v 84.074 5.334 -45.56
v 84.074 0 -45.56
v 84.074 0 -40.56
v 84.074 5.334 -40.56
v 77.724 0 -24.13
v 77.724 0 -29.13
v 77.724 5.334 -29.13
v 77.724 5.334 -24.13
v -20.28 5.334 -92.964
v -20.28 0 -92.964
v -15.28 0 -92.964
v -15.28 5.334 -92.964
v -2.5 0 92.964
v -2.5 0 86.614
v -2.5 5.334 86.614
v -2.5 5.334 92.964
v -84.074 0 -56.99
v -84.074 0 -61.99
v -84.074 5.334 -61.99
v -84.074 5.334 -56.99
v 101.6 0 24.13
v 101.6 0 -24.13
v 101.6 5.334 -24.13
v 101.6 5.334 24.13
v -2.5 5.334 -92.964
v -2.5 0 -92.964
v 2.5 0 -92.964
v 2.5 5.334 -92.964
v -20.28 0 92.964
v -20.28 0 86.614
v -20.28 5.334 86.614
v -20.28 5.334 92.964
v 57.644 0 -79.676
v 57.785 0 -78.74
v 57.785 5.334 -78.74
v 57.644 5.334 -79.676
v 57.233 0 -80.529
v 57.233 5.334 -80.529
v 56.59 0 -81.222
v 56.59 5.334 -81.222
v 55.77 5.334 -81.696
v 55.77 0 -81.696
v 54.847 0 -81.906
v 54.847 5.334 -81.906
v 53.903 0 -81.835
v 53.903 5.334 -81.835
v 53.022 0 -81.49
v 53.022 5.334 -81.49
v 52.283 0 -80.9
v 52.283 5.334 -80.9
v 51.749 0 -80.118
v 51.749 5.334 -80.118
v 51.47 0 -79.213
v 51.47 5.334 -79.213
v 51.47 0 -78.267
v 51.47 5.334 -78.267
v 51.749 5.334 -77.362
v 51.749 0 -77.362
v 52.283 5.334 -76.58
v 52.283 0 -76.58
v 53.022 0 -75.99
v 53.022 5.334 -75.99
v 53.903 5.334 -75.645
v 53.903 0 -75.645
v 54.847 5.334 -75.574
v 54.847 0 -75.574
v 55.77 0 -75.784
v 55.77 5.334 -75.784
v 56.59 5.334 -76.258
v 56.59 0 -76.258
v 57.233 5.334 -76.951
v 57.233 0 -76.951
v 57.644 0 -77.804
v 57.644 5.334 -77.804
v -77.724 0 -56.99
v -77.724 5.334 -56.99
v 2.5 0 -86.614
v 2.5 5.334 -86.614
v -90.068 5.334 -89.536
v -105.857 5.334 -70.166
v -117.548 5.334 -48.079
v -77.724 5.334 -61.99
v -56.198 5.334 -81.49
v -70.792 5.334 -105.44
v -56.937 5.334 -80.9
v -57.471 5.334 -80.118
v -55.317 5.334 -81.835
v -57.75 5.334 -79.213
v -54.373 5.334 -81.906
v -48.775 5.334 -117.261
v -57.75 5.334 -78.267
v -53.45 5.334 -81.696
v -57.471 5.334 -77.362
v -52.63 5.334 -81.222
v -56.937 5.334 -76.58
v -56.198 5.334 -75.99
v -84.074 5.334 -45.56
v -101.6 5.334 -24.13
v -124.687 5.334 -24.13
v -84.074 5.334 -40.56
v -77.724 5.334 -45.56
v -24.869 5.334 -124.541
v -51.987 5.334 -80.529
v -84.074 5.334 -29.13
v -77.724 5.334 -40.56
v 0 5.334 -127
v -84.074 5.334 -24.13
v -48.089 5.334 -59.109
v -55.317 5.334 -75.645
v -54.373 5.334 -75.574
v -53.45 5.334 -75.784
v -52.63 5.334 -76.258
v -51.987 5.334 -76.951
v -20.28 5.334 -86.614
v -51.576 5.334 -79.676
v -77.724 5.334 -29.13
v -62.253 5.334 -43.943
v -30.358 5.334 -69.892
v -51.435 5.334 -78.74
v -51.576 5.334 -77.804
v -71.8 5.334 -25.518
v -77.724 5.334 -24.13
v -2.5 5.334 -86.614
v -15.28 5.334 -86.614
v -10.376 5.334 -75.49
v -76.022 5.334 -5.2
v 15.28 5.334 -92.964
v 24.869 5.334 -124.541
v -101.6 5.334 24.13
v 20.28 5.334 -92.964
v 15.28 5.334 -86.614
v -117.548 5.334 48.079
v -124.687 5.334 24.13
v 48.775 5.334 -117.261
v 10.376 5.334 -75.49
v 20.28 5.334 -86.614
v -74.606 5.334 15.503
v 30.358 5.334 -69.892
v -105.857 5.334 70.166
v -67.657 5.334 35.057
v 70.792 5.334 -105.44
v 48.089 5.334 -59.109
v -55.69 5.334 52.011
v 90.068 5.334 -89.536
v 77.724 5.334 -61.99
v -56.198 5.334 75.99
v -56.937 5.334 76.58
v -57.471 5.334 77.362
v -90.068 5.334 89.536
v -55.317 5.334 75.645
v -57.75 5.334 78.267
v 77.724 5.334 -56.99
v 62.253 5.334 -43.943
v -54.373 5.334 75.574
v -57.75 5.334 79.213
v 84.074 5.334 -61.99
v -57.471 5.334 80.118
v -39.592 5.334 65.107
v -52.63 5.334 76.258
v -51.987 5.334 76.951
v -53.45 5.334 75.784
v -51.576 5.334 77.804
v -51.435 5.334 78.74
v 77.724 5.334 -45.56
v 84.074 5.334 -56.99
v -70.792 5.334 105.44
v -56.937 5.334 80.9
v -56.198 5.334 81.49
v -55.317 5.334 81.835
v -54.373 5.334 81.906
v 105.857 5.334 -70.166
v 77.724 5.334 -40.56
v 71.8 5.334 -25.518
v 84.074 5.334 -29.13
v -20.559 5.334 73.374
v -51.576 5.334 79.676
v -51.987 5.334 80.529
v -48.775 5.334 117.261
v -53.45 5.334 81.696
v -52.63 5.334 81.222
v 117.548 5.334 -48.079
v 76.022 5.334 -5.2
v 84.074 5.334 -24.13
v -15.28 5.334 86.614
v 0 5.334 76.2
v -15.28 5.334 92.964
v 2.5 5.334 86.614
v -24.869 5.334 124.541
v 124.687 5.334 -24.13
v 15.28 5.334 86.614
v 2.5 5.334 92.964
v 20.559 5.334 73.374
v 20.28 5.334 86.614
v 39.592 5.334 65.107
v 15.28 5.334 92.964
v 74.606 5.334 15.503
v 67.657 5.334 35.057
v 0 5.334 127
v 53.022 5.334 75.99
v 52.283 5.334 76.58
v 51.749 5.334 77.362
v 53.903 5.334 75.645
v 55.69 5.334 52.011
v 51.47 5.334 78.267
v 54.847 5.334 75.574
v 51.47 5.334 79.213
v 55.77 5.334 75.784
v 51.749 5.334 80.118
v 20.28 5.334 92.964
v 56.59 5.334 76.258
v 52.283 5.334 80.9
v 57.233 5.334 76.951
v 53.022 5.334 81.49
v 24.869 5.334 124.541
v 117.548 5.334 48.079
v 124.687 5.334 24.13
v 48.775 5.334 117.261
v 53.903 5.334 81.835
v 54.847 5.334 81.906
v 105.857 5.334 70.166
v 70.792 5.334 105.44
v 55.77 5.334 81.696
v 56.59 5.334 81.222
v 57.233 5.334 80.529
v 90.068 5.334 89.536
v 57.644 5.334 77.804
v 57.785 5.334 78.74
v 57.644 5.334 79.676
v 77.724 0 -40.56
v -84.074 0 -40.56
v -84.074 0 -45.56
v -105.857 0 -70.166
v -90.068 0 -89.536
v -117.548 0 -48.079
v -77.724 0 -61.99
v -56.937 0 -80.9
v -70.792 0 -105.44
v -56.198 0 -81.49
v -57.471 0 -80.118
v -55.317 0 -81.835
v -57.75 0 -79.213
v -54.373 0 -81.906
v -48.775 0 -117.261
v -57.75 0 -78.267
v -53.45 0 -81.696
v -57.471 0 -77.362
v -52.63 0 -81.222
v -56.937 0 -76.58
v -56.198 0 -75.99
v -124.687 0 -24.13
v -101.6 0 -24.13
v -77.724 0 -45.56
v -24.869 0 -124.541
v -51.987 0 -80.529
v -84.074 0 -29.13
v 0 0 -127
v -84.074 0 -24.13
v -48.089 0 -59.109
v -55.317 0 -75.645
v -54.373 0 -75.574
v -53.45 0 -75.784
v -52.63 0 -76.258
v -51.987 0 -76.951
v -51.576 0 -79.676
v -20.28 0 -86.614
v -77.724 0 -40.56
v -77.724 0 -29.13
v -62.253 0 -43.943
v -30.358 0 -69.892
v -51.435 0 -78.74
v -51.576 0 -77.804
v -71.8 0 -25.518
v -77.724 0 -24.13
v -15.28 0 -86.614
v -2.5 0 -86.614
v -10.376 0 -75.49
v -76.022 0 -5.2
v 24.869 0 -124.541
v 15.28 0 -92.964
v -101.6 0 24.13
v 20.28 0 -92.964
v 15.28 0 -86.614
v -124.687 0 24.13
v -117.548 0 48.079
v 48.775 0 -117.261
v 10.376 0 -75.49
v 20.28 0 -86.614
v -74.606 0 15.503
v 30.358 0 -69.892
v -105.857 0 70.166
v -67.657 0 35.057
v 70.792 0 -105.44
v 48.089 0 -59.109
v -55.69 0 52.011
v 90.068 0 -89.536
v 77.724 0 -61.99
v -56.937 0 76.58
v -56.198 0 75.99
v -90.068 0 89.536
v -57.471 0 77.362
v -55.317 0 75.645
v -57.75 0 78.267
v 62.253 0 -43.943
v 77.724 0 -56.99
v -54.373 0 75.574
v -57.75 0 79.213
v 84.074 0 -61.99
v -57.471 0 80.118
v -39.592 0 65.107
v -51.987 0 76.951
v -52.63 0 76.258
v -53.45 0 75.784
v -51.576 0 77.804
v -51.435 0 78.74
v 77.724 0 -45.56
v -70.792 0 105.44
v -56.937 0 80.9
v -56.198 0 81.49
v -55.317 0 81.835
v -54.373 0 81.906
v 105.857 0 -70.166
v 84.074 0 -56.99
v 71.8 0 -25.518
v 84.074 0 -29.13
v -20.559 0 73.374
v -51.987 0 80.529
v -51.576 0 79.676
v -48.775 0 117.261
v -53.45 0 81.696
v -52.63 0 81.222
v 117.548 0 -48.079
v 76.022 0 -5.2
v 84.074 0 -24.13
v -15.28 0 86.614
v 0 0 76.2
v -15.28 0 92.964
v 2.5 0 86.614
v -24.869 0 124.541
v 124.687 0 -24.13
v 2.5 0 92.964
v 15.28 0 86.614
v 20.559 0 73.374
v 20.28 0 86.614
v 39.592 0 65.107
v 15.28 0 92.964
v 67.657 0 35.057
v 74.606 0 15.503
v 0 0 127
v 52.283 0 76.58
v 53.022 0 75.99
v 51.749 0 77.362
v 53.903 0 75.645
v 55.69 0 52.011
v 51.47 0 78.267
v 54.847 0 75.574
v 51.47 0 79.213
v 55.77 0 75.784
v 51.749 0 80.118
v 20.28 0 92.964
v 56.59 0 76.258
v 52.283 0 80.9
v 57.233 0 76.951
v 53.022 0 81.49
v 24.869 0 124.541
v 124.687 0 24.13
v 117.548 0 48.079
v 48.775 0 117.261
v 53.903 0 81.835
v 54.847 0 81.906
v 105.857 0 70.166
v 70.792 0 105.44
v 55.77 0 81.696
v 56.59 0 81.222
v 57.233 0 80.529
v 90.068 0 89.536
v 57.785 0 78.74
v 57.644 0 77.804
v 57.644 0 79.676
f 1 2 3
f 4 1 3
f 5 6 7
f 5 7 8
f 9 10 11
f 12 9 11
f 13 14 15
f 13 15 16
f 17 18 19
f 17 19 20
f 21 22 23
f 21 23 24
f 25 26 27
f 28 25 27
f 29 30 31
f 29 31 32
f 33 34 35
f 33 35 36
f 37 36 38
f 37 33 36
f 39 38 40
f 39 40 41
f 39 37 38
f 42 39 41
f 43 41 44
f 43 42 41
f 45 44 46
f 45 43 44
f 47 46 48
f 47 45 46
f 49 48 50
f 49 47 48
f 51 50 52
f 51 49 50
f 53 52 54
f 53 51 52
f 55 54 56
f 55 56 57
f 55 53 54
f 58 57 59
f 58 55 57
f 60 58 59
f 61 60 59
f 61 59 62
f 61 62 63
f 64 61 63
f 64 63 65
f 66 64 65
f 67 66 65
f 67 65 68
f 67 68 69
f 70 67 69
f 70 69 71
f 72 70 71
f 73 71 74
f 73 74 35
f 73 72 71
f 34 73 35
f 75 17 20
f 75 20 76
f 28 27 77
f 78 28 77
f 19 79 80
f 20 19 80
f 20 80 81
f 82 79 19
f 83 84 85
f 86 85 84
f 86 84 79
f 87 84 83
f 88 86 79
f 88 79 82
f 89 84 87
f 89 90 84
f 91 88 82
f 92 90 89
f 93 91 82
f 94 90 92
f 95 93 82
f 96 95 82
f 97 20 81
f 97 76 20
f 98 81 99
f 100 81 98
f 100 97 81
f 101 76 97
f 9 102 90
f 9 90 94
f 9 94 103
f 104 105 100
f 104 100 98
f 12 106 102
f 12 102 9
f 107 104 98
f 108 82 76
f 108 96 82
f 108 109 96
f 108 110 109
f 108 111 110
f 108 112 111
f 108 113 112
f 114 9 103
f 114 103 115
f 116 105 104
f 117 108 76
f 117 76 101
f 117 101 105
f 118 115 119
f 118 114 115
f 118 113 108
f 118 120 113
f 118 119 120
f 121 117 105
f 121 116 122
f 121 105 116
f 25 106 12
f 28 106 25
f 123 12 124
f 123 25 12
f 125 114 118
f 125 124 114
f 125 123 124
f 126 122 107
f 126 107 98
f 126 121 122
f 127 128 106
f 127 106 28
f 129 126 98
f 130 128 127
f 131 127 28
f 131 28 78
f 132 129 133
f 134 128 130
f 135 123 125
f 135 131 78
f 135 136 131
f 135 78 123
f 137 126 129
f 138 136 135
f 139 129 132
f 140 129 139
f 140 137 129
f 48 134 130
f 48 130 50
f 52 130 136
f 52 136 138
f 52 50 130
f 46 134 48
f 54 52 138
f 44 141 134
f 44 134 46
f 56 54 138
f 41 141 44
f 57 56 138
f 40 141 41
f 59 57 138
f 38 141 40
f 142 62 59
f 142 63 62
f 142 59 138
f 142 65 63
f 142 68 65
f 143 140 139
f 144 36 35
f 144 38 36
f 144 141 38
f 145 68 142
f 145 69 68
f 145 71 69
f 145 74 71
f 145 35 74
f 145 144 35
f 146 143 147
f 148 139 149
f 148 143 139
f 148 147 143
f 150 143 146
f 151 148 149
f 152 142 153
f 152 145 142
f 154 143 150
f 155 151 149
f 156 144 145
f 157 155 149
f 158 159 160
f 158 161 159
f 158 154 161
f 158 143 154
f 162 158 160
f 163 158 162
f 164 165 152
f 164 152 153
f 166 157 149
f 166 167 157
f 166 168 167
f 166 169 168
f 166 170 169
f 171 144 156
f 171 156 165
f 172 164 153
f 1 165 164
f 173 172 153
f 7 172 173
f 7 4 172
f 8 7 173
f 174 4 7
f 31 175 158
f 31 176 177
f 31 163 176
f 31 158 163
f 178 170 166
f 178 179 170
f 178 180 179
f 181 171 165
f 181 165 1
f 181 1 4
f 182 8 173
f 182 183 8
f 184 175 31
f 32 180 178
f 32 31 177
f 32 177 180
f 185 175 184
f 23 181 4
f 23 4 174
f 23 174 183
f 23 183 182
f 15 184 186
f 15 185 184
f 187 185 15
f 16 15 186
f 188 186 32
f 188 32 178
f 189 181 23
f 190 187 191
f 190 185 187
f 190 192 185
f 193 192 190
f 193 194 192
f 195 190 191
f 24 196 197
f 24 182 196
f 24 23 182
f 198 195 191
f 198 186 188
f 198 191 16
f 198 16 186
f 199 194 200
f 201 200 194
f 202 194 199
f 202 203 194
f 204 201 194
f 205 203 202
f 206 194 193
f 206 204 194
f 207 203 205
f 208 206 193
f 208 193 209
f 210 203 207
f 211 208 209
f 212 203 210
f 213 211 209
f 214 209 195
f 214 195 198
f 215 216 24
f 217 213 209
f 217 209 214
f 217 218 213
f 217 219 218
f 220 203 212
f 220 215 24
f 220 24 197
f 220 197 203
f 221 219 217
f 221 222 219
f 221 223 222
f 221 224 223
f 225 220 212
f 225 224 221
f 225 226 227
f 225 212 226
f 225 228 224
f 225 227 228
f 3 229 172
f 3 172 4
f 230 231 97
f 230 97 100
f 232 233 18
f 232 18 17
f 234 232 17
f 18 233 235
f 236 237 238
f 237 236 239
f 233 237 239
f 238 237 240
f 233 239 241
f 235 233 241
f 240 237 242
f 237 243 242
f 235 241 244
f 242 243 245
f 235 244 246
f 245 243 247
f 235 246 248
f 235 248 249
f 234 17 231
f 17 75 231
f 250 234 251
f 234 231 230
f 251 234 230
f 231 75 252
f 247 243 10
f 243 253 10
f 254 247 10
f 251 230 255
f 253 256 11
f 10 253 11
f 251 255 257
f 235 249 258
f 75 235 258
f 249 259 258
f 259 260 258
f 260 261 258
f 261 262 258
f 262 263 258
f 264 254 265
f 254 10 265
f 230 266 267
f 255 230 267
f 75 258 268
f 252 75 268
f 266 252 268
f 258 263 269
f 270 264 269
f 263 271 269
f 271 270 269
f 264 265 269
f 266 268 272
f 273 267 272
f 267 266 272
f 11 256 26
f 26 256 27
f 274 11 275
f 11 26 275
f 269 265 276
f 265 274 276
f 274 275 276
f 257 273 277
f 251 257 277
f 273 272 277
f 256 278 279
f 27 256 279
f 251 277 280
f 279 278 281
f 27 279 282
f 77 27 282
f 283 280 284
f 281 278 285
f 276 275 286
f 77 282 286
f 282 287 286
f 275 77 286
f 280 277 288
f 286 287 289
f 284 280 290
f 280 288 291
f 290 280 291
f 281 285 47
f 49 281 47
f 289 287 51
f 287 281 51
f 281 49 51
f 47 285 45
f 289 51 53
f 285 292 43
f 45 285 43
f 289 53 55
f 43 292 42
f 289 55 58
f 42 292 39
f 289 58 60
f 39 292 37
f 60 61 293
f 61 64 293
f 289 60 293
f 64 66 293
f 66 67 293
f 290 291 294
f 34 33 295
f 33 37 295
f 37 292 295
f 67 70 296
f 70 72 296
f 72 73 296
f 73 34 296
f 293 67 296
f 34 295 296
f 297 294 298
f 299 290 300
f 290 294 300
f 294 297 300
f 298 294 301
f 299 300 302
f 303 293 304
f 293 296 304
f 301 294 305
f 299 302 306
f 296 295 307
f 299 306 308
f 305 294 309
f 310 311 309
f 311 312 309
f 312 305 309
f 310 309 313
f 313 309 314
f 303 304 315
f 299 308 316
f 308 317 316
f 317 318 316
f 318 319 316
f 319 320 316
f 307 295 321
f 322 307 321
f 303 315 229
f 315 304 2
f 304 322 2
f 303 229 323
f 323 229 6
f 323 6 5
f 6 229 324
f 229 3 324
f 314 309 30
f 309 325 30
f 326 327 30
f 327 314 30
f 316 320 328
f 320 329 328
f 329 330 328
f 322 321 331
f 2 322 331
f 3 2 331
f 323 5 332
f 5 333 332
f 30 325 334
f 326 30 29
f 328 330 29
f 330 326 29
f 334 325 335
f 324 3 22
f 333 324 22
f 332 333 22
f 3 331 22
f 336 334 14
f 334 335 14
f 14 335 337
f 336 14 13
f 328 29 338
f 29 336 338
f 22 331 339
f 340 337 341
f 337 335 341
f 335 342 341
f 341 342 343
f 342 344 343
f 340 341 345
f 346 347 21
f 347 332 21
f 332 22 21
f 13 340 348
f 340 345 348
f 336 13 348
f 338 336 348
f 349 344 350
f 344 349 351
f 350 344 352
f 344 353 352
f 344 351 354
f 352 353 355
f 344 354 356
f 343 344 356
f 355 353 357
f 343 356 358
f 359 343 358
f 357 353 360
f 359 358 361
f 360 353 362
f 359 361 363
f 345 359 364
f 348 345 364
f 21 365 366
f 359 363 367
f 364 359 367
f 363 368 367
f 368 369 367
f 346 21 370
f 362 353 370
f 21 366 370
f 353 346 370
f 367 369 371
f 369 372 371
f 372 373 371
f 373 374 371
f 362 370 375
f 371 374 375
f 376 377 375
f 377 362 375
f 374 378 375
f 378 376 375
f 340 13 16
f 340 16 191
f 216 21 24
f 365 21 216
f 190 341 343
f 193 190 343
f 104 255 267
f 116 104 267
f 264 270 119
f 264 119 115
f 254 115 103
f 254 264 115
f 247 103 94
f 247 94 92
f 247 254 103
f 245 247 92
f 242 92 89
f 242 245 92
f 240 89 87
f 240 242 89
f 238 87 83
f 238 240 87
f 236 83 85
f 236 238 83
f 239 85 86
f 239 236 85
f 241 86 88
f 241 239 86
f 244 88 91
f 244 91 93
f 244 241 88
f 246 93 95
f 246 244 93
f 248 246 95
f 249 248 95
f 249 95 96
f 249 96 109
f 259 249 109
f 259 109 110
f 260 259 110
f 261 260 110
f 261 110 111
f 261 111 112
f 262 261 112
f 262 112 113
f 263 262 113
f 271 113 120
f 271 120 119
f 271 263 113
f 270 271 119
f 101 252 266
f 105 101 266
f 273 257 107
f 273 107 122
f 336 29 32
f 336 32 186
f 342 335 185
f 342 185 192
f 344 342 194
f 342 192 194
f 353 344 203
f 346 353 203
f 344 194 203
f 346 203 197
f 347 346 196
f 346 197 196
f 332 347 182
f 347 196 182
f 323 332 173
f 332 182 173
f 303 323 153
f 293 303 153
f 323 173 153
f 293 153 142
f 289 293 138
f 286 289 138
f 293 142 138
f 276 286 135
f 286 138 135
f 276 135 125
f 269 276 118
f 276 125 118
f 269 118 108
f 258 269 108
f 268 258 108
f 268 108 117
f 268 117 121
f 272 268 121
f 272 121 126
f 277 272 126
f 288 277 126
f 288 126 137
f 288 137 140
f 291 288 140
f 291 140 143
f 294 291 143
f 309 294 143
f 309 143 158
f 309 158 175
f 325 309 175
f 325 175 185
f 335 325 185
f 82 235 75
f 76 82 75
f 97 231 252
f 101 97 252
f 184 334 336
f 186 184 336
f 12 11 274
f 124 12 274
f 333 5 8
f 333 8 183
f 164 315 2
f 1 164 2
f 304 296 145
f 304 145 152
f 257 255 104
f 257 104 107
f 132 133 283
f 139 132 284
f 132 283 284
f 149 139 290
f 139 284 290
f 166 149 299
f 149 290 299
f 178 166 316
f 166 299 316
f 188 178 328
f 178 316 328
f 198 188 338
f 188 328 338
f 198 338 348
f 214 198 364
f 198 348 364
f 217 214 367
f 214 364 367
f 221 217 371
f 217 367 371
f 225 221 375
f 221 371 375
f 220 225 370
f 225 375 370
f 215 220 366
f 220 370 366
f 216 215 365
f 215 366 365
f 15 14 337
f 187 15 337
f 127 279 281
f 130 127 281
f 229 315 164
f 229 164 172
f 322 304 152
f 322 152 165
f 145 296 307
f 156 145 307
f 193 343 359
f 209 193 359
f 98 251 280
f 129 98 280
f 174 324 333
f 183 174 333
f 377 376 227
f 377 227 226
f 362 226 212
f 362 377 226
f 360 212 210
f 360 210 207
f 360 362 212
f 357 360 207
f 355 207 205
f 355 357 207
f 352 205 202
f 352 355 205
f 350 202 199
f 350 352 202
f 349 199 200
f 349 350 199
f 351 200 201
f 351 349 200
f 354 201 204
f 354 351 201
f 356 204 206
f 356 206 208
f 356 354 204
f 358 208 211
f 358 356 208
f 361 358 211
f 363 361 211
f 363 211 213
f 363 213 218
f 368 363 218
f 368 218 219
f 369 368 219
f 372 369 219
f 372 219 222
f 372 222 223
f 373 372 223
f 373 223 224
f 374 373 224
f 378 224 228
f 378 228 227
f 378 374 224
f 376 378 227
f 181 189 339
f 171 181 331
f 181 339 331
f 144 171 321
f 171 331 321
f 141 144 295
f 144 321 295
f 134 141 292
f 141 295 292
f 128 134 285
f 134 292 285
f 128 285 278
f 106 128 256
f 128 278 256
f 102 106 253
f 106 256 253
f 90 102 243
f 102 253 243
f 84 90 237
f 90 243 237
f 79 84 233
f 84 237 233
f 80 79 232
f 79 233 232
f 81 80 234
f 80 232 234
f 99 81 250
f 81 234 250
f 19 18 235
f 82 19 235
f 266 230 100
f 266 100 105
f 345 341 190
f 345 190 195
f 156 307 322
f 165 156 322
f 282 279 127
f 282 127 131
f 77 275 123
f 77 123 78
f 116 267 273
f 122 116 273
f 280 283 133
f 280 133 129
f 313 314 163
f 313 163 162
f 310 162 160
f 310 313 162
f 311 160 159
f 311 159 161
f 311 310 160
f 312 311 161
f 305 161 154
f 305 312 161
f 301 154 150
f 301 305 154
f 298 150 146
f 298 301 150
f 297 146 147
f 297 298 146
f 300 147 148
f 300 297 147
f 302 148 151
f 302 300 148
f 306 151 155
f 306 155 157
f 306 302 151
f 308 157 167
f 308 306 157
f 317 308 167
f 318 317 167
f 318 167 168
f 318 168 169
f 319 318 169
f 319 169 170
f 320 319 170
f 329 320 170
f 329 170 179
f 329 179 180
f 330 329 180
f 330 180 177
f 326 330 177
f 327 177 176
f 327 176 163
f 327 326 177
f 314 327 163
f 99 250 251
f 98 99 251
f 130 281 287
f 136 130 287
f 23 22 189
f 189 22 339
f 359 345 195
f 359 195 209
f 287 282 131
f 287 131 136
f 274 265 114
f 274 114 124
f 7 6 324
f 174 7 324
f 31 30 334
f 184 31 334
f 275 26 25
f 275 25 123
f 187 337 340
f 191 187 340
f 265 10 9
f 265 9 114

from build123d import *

# Parameters (mm, degrees)
SKETCH1_R          = 127
BASE_DEPTH         = 5.334
SKETCH2_R          = 76.2
CENTER_CUT_DEPTH   = 180.684310823
SKETCH14_W         = 5
SKETCH14_H         = 6.35
SKETCH14_W_2       = 6.35
SKETCH14_H_2       = 5
CUT_EXTRUDE1_DEPTH = 180.684310823
SKETCH15_W         = 30.48
SKETCH15_H         = 48.26
CUT_EXTRUDE2_DEPTH = 180.684310823
HOLE1_OUTLINE_R    = 3.175
HOLE1_DEPTH        = 5.334


# Read off the part's stored shape, not the designer's step: Hole1
with BuildPart() as part:
    # Sketch1 → Base (new body)
    with BuildSketch(Plane(origin=(0, 0, 0), x_dir=(1, 0, 0), z_dir=(0, 1, 0))):
        with Locations(Location((0, 0, 0), (0, 0, 270))):
            Circle(SKETCH1_R)
    extrude(amount=BASE_DEPTH)

    # Sketch2 → Center Cut (cut, through all)
    with BuildSketch(Plane(origin=(0, 5.334, 0), x_dir=(1, 0, 0), z_dir=(0, 1, 0))):
        with Locations(Location((0, 0, 0), (0, 0, 270))):
            Circle(SKETCH2_R)
    extrude(amount=-CENTER_CUT_DEPTH, mode=Mode.SUBTRACT)

    # Sketch14 → Cut-Extrude1 (cut, through all)
    with BuildSketch(Plane.XZ):
        with Locations((0, 89.789)):
            Rectangle(SKETCH14_W, SKETCH14_H)
        with Locations((-17.78, 89.789)):
            Rectangle(SKETCH14_W, SKETCH14_H)
        with Locations((17.78, 89.789)):
            Rectangle(SKETCH14_W, SKETCH14_H)
        with Locations((-80.899, -26.63)):
            Rectangle(SKETCH14_W_2, SKETCH14_H_2)
        with Locations((-80.899, -43.06)):
            Rectangle(SKETCH14_W_2, SKETCH14_H_2)
        with Locations((-80.899, -59.49)):
            Rectangle(SKETCH14_W_2, SKETCH14_H_2)
        with Locations((80.899, -26.63)):
            Rectangle(SKETCH14_W_2, SKETCH14_H_2)
        with Locations((80.899, -43.06)):
            Rectangle(SKETCH14_W_2, SKETCH14_H_2)
        with Locations((80.899, -59.49)):
            Rectangle(SKETCH14_W_2, SKETCH14_H_2)
        with Locations((17.78, -89.789)):
            Rectangle(SKETCH14_W, SKETCH14_H)
        with Locations((0, -89.789)):
            Rectangle(SKETCH14_W, SKETCH14_H)
        with Locations((-17.78, -89.789)):
            Rectangle(SKETCH14_W, SKETCH14_H)
    extrude(amount=-CUT_EXTRUDE1_DEPTH, mode=Mode.SUBTRACT)

    # Sketch15 → Cut-Extrude2 (cut, through all)
    with BuildSketch(Plane.XZ):
        with Locations((-116.84, 0)):
            Rectangle(SKETCH15_W, SKETCH15_H)
        with Locations((116.84, 0)):
            Rectangle(SKETCH15_W, SKETCH15_H)
    extrude(amount=-CUT_EXTRUDE2_DEPTH, mode=Mode.SUBTRACT)

    # Hole1 outline → Hole1 (cut)
    with BuildSketch(Plane(origin=(0, 0, 0), x_dir=(1, 0, 0), z_dir=(0, 1, 0))):
        with Locations((-54.61, -78.74)):
            Circle(HOLE1_OUTLINE_R)
        with Locations((54.61, -78.74)):
            Circle(HOLE1_OUTLINE_R)
        with Locations((54.61, 78.74)):
            Circle(HOLE1_OUTLINE_R)
        with Locations((-54.61, 78.74)):
            Circle(HOLE1_OUTLINE_R)
    extrude(amount=HOLE1_DEPTH, mode=Mode.SUBTRACT)


solid = part.part
